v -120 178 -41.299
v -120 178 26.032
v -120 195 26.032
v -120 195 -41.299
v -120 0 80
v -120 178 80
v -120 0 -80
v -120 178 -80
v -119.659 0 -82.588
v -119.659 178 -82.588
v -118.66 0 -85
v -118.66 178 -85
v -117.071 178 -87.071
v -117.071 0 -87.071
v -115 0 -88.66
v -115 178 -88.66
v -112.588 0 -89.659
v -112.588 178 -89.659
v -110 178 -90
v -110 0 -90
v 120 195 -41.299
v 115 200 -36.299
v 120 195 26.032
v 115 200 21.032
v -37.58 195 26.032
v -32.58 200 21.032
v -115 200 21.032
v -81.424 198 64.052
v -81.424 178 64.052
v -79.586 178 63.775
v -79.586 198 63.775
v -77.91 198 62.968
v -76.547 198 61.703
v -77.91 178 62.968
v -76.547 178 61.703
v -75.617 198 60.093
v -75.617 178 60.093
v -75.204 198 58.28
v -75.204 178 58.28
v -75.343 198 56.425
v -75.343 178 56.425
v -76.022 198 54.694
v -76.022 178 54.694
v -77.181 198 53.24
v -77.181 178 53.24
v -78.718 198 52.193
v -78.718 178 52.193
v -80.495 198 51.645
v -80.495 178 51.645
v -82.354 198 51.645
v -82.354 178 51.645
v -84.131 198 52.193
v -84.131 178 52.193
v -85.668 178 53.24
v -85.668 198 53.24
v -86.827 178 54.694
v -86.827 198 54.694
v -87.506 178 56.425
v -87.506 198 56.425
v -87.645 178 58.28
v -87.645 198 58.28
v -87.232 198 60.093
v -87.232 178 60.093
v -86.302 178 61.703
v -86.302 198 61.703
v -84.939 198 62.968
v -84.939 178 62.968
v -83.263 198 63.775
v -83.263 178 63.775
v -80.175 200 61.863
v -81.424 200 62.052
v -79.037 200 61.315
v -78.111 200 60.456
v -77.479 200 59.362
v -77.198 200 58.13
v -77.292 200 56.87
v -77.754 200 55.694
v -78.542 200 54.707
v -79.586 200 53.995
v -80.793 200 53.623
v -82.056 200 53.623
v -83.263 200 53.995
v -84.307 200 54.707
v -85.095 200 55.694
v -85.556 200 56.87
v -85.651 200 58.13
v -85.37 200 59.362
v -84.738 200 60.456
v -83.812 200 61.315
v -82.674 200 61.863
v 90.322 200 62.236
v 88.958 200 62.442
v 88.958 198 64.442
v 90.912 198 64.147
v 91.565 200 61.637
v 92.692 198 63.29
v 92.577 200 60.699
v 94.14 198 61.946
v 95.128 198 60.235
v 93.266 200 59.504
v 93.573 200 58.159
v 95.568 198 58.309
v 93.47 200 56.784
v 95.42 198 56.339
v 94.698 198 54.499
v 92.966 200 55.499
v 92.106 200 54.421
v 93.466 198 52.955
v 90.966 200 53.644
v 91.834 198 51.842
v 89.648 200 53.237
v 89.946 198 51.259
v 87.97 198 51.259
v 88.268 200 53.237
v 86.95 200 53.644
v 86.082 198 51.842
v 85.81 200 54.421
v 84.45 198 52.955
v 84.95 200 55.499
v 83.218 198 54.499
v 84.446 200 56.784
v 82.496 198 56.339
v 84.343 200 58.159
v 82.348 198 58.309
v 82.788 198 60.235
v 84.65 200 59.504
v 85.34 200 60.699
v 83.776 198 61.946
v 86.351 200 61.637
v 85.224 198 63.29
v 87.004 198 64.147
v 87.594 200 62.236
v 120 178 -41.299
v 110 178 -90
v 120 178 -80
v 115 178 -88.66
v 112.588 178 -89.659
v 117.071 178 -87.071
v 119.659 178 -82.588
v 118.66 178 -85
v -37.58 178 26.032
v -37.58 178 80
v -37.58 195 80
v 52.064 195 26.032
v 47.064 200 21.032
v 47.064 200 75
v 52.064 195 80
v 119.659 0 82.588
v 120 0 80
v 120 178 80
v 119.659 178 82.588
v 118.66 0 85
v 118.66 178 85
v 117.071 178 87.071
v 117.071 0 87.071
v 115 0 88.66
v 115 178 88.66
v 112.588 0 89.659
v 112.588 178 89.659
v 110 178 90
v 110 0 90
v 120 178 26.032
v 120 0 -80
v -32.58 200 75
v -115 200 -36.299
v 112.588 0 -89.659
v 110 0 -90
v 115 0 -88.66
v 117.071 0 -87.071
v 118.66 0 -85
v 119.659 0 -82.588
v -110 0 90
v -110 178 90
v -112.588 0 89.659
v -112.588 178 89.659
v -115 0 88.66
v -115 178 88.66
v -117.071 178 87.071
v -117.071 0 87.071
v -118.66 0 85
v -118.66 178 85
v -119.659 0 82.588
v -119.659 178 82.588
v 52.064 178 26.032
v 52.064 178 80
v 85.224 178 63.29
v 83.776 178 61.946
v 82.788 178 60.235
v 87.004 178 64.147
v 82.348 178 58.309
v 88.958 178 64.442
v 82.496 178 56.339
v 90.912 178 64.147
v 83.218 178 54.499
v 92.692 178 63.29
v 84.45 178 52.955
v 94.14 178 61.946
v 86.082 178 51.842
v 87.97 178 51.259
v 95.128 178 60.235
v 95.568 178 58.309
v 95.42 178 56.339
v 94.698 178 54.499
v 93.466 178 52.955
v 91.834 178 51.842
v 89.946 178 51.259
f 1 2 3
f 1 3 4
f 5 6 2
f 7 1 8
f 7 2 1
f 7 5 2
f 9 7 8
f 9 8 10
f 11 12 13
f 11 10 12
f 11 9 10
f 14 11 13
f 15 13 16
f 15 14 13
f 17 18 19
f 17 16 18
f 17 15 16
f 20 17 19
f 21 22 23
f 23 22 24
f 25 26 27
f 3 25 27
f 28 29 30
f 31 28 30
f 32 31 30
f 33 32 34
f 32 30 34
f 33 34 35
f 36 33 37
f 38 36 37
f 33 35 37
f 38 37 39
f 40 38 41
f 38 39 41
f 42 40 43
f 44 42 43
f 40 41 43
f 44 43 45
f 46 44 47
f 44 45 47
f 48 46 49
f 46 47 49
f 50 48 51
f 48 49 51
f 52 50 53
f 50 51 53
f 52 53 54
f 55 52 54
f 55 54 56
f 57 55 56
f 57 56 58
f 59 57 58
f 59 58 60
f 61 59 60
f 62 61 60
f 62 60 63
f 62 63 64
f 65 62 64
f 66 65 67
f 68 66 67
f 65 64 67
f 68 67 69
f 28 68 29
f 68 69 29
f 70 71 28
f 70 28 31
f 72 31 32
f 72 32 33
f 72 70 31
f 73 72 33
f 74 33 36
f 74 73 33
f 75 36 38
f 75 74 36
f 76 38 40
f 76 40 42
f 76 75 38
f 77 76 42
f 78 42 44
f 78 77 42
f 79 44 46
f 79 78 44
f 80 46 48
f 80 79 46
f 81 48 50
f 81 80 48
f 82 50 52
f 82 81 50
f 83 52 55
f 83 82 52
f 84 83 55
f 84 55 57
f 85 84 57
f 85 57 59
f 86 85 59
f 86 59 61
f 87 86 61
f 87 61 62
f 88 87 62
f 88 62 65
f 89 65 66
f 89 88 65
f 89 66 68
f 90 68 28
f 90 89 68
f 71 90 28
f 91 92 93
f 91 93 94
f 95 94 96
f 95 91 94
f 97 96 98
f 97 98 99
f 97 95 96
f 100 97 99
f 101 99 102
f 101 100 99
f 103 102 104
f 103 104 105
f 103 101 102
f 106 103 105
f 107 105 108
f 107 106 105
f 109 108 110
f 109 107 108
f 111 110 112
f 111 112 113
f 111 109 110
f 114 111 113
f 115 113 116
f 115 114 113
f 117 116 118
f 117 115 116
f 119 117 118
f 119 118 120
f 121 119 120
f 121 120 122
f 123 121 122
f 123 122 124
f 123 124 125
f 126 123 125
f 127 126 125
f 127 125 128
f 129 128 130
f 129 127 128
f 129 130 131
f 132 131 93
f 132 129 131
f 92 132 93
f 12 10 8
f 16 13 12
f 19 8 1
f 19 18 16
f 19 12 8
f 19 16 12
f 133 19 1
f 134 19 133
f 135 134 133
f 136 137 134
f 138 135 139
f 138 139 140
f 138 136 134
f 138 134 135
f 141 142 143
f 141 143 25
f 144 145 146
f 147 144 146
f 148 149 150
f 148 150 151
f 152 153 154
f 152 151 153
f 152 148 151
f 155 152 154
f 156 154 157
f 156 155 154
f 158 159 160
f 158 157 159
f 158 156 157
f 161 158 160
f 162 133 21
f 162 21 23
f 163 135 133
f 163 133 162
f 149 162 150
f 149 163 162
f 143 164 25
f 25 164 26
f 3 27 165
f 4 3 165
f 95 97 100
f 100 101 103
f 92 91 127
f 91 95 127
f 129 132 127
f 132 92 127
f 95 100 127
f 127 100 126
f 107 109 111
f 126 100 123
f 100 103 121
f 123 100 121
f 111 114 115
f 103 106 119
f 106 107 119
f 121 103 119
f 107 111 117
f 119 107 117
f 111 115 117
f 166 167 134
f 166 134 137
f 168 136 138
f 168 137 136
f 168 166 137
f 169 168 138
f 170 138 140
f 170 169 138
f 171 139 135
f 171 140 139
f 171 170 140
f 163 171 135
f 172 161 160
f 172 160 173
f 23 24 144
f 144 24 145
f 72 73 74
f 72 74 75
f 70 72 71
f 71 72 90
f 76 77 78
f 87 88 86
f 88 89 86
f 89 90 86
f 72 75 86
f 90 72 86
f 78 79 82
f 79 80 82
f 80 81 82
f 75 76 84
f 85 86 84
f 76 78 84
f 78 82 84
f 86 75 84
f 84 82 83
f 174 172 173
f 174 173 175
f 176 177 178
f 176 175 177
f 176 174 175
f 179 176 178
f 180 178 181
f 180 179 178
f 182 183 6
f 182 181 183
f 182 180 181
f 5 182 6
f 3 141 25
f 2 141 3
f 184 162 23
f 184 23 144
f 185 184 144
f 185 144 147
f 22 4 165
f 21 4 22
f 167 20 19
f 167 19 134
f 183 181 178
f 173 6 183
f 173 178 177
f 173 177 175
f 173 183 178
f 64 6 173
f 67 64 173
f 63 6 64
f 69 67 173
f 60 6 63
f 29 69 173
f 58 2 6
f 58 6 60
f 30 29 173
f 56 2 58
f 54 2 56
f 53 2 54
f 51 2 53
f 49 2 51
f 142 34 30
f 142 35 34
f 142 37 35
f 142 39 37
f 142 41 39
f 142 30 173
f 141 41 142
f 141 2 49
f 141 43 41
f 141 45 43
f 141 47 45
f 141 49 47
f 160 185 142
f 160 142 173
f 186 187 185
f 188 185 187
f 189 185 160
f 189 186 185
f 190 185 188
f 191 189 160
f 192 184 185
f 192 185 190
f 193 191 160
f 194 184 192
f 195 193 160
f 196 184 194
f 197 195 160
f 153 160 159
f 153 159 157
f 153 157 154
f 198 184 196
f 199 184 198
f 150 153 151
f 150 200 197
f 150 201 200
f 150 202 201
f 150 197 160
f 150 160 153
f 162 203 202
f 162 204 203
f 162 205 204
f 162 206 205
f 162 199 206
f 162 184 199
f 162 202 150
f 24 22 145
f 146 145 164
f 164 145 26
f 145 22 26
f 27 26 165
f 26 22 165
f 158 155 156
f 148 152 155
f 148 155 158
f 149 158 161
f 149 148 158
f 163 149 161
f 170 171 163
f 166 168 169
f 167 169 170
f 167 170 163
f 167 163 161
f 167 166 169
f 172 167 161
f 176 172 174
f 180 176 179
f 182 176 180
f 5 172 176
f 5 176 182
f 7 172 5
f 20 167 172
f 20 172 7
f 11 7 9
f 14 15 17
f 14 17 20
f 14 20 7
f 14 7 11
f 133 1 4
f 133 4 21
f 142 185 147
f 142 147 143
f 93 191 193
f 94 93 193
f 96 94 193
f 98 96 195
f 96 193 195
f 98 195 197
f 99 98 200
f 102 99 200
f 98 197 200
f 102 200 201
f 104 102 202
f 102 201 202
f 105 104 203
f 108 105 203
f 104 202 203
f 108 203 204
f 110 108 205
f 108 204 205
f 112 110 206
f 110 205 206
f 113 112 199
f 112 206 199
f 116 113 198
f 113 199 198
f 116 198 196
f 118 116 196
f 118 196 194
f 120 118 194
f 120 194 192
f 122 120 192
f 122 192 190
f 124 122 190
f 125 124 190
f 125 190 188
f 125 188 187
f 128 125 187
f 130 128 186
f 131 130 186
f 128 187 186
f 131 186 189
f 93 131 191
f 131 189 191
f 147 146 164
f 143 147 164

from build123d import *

# Parameters (mm, degrees)
SALIENTE_EXTRUIR2_DEPTH = 200
CORTAR_EXTRUIR1_START   = -22
CROQUIS2_R              = 6.238263744
CROQUIS2_R_2            = 6.628155228
CORTAR_EXTRUIR1_DEPTH   = 22
CHAFL_N1_SIZE           = 2
CHAFL_N2_SIZE           = 5


with BuildPart() as part:
    # Croquis1 → Saliente-Extruir2 (new body)
    with BuildSketch(Plane(origin=(0, 0, 0), x_dir=(1, 0, 0), z_dir=(0, 1, 0))):
        with BuildLine():
            Line((-110, 90), (110, 90))
            ThreePointArc((110, 90), (117.071067812, 87.071067812), (120, 80))
            Line((120, 80), (120, -80))
            ThreePointArc((120, -80), (117.071067812, -87.071067812), (110, -90))
            Line((110, -90), (-110, -90))
            ThreePointArc((-110, -90), (-117.071067812, -87.071067812), (-120, -80))
            Line((-120, -80), (-120, 80))
            ThreePointArc((-120, 80), (-117.071067812, 87.071067812), (-110, 90))
        make_face()
    extrude(amount=SALIENTE_EXTRUIR2_DEPTH)

    # Croquis2 → Cortar-Extruir1 (cut)
    # profile 1 of 2: a face of its own
    with BuildSketch(Plane(origin=(0, 200, 0), x_dir=(1, 0, 0), z_dir=(0, 1, 0)).offset(CORTAR_EXTRUIR1_START)):
        with BuildLine():
            Line((-120, 80), (-120, 41.298746549))
            Line((-120, 41.298746549), (120, 41.298746549))
            Line((120, 41.298746549), (120, 80))
            ThreePointArc((120, 80), (117.071067812, 87.071067812), (110, 90))
            Line((110, 90), (-110, 90))
            ThreePointArc((-110, 90), (-117.071067812, 87.071067812), (-120, 80))
        make_face()
    # profile 2 of 2: a face of its own
    with BuildSketch(Plane(origin=(0, 200, 0), x_dir=(1, 0, 0), z_dir=(0, 1, 0)).offset(CORTAR_EXTRUIR1_START)):
        with BuildLine():
            Line((-37.579902073, -26.031911332), (-120, -26.031911332))
            Line((-120, -26.031911332), (-120, -80))
            ThreePointArc((-120, -80), (-117.071067812, -87.071067812), (-110, -90))
            Line((-110, -90), (110, -90))
            ThreePointArc((110, -90), (117.071067812, -87.071067812), (120, -80))
            Line((120, -80), (120, -26.031911332))
            Line((120, -26.031911332), (52.063822663, -26.031911332))
            Line((52.063822663, -26.031911332), (52.063822663, -80))
            Line((52.063822663, -80), (-37.579902073, -80))
            Line((-37.579902073, -80), (-37.579902073, -26.031911332))
        make_face()
        with Locations(Location((-81.424491258, -57.813449816, 0), (0, 0, 270))):
            Circle(CROQUIS2_R, mode=Mode.SUBTRACT)
        with Locations(Location((88.958087252, -57.813449816, 0), (0, 0, 270))):
            Circle(CROQUIS2_R_2, mode=Mode.SUBTRACT)
    extrude(amount=CORTAR_EXTRUIR1_DEPTH, mode=Mode.SUBTRACT)

    # Chaflán1
    chafl_n1_edges = [part.edges().sort_by_distance(p)[0] for p in [
        (-81.424491258, 200, 51.575186072),
        (88.958087252, 200, 51.185294588),
    ]]
    chamfer(chafl_n1_edges, length=CHAFL_N1_SIZE)

    # Chaflán2
    chafl_n2_edges = [part.edges().sort_by_distance(p)[0] for p in [
        (-120, 200, -7.633417609),
        (0, 200, -41.298746549),
        (120, 200, -7.633417609),
        (52.063822663, 200, 53.015955666),
        (-37.579902073, 200, 53.015955666),
        (7.241960295, 200, 80),
        (-78.789951036, 200, 26.031911332),
        (86.031911332, 200, 26.031911332),
    ]]
    chamfer(chafl_n2_edges, length=CHAFL_N2_SIZE)


solid = part.part
